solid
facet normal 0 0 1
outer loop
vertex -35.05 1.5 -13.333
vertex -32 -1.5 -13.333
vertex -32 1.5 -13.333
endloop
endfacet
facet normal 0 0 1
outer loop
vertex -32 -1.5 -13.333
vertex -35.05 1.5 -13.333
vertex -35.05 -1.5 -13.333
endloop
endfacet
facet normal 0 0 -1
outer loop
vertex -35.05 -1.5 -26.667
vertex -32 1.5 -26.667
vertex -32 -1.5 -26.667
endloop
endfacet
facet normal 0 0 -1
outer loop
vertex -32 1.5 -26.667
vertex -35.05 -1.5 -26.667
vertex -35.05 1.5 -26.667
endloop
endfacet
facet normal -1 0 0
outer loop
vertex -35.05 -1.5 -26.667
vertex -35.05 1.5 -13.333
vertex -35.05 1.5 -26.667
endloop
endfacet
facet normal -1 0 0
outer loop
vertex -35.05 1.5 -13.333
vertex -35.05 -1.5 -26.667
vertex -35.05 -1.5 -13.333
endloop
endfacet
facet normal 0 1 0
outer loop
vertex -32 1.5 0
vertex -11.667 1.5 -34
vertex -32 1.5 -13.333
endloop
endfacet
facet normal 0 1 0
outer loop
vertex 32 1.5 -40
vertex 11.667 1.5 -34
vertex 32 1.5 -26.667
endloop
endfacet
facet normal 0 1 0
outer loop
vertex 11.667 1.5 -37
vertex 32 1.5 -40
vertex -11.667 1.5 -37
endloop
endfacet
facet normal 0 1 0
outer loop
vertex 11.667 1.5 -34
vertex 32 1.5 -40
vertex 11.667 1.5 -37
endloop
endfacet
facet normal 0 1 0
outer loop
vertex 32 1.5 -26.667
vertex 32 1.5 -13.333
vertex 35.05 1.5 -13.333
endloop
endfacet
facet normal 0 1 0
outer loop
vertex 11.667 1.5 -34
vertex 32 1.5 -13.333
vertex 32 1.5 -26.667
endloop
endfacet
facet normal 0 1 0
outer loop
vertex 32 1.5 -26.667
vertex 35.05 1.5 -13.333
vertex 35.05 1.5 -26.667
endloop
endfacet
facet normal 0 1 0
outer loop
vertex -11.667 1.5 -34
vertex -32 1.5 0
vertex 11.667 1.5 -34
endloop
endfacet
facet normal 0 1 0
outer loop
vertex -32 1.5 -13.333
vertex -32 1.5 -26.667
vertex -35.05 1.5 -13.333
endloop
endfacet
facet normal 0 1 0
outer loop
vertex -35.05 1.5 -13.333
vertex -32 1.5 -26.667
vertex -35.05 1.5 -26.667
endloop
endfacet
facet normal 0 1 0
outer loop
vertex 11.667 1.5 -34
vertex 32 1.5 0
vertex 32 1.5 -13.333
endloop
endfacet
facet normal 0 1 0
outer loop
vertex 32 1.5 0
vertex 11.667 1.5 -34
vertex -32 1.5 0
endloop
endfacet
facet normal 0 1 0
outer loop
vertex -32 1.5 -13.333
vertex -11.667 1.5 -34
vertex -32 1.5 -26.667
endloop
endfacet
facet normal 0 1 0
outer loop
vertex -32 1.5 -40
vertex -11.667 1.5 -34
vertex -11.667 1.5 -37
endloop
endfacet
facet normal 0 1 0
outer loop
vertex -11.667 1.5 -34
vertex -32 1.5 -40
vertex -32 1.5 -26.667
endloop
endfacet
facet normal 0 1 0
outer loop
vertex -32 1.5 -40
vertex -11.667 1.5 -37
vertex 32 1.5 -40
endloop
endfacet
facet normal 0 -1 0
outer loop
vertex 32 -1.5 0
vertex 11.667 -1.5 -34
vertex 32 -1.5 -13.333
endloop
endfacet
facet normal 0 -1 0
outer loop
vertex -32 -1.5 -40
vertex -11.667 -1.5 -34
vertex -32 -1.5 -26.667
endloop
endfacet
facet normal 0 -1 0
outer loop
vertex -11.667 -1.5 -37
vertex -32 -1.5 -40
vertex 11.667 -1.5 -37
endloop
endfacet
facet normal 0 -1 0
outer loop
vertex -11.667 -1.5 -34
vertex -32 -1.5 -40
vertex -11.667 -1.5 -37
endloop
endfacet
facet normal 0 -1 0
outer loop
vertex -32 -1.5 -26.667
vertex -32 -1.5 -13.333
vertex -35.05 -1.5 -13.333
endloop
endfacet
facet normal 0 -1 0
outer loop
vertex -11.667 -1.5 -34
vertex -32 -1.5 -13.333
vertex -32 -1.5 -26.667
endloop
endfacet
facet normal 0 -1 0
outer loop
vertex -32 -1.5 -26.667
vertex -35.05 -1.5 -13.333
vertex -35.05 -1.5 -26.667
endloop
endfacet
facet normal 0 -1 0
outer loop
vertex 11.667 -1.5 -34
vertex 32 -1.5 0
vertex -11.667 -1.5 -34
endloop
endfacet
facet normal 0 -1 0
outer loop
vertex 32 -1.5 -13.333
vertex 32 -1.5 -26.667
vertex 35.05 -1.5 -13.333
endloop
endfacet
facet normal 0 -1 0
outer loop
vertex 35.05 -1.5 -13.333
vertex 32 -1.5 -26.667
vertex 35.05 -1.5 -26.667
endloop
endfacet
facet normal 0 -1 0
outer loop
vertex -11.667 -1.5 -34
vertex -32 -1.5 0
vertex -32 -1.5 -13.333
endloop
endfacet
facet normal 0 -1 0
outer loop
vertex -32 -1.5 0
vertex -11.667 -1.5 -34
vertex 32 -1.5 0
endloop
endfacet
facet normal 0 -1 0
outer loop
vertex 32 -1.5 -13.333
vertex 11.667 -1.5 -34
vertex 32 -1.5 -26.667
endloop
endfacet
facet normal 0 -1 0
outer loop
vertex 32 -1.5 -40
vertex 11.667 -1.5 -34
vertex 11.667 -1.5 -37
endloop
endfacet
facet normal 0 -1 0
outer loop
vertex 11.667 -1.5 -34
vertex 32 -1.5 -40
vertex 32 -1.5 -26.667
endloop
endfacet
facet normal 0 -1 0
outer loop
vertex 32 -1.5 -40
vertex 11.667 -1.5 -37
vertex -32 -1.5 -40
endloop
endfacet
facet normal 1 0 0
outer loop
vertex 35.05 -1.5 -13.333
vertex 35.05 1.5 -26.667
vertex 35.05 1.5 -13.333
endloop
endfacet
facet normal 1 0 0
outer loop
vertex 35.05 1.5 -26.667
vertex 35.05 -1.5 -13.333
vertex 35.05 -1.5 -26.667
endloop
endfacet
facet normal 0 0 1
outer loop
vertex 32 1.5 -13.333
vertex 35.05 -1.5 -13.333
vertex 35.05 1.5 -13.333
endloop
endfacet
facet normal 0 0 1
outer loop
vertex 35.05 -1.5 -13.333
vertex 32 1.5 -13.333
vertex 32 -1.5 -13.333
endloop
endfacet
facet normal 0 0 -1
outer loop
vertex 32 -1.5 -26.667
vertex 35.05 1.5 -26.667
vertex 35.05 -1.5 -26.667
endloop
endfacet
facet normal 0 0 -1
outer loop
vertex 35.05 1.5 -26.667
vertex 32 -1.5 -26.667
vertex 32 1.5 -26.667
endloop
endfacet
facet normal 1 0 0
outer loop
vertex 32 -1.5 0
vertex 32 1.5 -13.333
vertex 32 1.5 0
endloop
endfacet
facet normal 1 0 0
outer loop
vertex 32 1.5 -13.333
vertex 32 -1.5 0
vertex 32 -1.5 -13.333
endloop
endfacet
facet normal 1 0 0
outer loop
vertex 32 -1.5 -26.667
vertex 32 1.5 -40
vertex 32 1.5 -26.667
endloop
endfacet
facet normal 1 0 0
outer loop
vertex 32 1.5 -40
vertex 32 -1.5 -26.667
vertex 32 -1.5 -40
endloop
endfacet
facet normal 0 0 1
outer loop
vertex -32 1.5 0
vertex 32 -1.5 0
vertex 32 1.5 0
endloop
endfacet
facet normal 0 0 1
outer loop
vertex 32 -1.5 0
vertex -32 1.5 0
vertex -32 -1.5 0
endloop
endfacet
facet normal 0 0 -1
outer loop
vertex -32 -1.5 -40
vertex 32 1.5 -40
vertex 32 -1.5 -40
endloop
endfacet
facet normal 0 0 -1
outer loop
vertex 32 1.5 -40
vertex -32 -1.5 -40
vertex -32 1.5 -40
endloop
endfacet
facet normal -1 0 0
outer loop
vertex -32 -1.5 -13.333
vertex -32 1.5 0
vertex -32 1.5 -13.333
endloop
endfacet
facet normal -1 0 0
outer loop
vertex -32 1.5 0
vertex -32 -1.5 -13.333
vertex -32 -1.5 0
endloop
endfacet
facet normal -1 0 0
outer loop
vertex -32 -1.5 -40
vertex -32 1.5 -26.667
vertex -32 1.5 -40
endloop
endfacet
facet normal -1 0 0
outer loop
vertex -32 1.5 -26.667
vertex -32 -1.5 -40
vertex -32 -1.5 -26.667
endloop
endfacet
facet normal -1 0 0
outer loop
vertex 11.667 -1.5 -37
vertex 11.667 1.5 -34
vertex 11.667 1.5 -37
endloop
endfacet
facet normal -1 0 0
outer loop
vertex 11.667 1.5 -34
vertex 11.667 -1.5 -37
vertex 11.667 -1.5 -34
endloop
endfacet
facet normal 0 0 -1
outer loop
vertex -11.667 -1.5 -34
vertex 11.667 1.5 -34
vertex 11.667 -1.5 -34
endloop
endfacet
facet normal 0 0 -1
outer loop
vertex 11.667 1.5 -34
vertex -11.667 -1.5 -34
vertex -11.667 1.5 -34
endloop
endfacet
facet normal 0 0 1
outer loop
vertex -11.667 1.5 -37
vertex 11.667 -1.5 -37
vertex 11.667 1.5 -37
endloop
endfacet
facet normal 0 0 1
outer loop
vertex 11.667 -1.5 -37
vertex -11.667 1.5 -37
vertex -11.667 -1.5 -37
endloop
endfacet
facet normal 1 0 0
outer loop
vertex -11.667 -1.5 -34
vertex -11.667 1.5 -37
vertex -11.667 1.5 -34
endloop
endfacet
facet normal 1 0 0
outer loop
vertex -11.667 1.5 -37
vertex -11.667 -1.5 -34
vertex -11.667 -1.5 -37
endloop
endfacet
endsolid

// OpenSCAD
// file: config.scad
include <../config.scad>;

// settings specific to this pot type

inset_front = material_z/2;
inset_back = material_z/2;
inset_bottom = material_z;

hole_radius = 1.5;

hook_round_top_z = 3;
hook_round_bottom_z = 3;
// file: ../config.scad
// all measures in millimeters

// rendering quality
$fn = 200;
nothing = 0.05;

// material to cut from
material_x = 1000;
material_y = 500;
material_z = 3;

// plate to cut from
module base_material()
{
    translate([0, 0, -material_z*3/2-nothing])
    cube([
        material_x,
        material_y,
        material_z
        ]);
}

// wall configuration: bounding box measures
wall_x = 550;
wall_y = 30;
wall_z = 400;

// the round top is added on top of the wall
wall_round_top_z = 8;

// length of the foot towards the front and back of the wall (asymmetrical)
foot_y_back = 100;
foot_y_front = 175;
foot_y = foot_y_front + foot_y_back;

// foot height
foot_z = 25;

// rounded corners at front and back of the foot
foot_round_y = 20;

foot_gap_y = (foot_y_front + foot_y_back) * 0.8;
foot_gap_z = material_z;

// number of support beams
support_count = 6;

// height of a support beam
support_z = 25;

// pot configuration: outer measures of the top opening
// small pots:
pot_x = 70;
pot_y = 70;
pot_z = 40;
/*
// medium size pots:
pot_x = 80;
pot_y = 80;
pot_z = 50;
*/

// pots have hooks to hang at the wall supports
hook_width = 10;

// screw: M3
screw_diameter = 2.85;
screw_length = 5.5;
nut_height = 2.4 -0.5;
nut_wrench_size = 5.0;
nut_offset = material_z;
washer_radius = 7;
// main file
include <../config.scad>;
include <config.scad>;

module pot_front_without_holes()
{
    // upper edge of wall is at z=0
    translate([
        0,
        0,
        -pot_z/2
        ])
    cube([
        pot_x - 2*material_z,
        material_z,
        pot_z
        ], center=true);

    // side noses
    for (x = [
            - pot_x/2 + material_z/2,
            + pot_x/2 - material_z/2
            ])
        translate([
            x,
            0,
            - pot_z/2
            ])
        cube([
            material_z + 2*nothing,
            material_z,
            pot_z/3
            ], center=true);
}

module pot_front()
{
    difference()
    {
        pot_front_without_holes();

        // hole for the bottom plane's nose
        translate([0, 0, - pot_z + material_z/2 + inset_bottom])
        cube([
            pot_x/3,
            material_z + nothing,
            material_z
            ], center=true);
    }
}

module pot_back()
{
    pot_front();

    translate([
        0,
        0,
        hook_width/2
        ])
    cube([
        pot_x - 2*material_z,
        material_z,
        hook_width
        ], center=true);
}

pot_front();
